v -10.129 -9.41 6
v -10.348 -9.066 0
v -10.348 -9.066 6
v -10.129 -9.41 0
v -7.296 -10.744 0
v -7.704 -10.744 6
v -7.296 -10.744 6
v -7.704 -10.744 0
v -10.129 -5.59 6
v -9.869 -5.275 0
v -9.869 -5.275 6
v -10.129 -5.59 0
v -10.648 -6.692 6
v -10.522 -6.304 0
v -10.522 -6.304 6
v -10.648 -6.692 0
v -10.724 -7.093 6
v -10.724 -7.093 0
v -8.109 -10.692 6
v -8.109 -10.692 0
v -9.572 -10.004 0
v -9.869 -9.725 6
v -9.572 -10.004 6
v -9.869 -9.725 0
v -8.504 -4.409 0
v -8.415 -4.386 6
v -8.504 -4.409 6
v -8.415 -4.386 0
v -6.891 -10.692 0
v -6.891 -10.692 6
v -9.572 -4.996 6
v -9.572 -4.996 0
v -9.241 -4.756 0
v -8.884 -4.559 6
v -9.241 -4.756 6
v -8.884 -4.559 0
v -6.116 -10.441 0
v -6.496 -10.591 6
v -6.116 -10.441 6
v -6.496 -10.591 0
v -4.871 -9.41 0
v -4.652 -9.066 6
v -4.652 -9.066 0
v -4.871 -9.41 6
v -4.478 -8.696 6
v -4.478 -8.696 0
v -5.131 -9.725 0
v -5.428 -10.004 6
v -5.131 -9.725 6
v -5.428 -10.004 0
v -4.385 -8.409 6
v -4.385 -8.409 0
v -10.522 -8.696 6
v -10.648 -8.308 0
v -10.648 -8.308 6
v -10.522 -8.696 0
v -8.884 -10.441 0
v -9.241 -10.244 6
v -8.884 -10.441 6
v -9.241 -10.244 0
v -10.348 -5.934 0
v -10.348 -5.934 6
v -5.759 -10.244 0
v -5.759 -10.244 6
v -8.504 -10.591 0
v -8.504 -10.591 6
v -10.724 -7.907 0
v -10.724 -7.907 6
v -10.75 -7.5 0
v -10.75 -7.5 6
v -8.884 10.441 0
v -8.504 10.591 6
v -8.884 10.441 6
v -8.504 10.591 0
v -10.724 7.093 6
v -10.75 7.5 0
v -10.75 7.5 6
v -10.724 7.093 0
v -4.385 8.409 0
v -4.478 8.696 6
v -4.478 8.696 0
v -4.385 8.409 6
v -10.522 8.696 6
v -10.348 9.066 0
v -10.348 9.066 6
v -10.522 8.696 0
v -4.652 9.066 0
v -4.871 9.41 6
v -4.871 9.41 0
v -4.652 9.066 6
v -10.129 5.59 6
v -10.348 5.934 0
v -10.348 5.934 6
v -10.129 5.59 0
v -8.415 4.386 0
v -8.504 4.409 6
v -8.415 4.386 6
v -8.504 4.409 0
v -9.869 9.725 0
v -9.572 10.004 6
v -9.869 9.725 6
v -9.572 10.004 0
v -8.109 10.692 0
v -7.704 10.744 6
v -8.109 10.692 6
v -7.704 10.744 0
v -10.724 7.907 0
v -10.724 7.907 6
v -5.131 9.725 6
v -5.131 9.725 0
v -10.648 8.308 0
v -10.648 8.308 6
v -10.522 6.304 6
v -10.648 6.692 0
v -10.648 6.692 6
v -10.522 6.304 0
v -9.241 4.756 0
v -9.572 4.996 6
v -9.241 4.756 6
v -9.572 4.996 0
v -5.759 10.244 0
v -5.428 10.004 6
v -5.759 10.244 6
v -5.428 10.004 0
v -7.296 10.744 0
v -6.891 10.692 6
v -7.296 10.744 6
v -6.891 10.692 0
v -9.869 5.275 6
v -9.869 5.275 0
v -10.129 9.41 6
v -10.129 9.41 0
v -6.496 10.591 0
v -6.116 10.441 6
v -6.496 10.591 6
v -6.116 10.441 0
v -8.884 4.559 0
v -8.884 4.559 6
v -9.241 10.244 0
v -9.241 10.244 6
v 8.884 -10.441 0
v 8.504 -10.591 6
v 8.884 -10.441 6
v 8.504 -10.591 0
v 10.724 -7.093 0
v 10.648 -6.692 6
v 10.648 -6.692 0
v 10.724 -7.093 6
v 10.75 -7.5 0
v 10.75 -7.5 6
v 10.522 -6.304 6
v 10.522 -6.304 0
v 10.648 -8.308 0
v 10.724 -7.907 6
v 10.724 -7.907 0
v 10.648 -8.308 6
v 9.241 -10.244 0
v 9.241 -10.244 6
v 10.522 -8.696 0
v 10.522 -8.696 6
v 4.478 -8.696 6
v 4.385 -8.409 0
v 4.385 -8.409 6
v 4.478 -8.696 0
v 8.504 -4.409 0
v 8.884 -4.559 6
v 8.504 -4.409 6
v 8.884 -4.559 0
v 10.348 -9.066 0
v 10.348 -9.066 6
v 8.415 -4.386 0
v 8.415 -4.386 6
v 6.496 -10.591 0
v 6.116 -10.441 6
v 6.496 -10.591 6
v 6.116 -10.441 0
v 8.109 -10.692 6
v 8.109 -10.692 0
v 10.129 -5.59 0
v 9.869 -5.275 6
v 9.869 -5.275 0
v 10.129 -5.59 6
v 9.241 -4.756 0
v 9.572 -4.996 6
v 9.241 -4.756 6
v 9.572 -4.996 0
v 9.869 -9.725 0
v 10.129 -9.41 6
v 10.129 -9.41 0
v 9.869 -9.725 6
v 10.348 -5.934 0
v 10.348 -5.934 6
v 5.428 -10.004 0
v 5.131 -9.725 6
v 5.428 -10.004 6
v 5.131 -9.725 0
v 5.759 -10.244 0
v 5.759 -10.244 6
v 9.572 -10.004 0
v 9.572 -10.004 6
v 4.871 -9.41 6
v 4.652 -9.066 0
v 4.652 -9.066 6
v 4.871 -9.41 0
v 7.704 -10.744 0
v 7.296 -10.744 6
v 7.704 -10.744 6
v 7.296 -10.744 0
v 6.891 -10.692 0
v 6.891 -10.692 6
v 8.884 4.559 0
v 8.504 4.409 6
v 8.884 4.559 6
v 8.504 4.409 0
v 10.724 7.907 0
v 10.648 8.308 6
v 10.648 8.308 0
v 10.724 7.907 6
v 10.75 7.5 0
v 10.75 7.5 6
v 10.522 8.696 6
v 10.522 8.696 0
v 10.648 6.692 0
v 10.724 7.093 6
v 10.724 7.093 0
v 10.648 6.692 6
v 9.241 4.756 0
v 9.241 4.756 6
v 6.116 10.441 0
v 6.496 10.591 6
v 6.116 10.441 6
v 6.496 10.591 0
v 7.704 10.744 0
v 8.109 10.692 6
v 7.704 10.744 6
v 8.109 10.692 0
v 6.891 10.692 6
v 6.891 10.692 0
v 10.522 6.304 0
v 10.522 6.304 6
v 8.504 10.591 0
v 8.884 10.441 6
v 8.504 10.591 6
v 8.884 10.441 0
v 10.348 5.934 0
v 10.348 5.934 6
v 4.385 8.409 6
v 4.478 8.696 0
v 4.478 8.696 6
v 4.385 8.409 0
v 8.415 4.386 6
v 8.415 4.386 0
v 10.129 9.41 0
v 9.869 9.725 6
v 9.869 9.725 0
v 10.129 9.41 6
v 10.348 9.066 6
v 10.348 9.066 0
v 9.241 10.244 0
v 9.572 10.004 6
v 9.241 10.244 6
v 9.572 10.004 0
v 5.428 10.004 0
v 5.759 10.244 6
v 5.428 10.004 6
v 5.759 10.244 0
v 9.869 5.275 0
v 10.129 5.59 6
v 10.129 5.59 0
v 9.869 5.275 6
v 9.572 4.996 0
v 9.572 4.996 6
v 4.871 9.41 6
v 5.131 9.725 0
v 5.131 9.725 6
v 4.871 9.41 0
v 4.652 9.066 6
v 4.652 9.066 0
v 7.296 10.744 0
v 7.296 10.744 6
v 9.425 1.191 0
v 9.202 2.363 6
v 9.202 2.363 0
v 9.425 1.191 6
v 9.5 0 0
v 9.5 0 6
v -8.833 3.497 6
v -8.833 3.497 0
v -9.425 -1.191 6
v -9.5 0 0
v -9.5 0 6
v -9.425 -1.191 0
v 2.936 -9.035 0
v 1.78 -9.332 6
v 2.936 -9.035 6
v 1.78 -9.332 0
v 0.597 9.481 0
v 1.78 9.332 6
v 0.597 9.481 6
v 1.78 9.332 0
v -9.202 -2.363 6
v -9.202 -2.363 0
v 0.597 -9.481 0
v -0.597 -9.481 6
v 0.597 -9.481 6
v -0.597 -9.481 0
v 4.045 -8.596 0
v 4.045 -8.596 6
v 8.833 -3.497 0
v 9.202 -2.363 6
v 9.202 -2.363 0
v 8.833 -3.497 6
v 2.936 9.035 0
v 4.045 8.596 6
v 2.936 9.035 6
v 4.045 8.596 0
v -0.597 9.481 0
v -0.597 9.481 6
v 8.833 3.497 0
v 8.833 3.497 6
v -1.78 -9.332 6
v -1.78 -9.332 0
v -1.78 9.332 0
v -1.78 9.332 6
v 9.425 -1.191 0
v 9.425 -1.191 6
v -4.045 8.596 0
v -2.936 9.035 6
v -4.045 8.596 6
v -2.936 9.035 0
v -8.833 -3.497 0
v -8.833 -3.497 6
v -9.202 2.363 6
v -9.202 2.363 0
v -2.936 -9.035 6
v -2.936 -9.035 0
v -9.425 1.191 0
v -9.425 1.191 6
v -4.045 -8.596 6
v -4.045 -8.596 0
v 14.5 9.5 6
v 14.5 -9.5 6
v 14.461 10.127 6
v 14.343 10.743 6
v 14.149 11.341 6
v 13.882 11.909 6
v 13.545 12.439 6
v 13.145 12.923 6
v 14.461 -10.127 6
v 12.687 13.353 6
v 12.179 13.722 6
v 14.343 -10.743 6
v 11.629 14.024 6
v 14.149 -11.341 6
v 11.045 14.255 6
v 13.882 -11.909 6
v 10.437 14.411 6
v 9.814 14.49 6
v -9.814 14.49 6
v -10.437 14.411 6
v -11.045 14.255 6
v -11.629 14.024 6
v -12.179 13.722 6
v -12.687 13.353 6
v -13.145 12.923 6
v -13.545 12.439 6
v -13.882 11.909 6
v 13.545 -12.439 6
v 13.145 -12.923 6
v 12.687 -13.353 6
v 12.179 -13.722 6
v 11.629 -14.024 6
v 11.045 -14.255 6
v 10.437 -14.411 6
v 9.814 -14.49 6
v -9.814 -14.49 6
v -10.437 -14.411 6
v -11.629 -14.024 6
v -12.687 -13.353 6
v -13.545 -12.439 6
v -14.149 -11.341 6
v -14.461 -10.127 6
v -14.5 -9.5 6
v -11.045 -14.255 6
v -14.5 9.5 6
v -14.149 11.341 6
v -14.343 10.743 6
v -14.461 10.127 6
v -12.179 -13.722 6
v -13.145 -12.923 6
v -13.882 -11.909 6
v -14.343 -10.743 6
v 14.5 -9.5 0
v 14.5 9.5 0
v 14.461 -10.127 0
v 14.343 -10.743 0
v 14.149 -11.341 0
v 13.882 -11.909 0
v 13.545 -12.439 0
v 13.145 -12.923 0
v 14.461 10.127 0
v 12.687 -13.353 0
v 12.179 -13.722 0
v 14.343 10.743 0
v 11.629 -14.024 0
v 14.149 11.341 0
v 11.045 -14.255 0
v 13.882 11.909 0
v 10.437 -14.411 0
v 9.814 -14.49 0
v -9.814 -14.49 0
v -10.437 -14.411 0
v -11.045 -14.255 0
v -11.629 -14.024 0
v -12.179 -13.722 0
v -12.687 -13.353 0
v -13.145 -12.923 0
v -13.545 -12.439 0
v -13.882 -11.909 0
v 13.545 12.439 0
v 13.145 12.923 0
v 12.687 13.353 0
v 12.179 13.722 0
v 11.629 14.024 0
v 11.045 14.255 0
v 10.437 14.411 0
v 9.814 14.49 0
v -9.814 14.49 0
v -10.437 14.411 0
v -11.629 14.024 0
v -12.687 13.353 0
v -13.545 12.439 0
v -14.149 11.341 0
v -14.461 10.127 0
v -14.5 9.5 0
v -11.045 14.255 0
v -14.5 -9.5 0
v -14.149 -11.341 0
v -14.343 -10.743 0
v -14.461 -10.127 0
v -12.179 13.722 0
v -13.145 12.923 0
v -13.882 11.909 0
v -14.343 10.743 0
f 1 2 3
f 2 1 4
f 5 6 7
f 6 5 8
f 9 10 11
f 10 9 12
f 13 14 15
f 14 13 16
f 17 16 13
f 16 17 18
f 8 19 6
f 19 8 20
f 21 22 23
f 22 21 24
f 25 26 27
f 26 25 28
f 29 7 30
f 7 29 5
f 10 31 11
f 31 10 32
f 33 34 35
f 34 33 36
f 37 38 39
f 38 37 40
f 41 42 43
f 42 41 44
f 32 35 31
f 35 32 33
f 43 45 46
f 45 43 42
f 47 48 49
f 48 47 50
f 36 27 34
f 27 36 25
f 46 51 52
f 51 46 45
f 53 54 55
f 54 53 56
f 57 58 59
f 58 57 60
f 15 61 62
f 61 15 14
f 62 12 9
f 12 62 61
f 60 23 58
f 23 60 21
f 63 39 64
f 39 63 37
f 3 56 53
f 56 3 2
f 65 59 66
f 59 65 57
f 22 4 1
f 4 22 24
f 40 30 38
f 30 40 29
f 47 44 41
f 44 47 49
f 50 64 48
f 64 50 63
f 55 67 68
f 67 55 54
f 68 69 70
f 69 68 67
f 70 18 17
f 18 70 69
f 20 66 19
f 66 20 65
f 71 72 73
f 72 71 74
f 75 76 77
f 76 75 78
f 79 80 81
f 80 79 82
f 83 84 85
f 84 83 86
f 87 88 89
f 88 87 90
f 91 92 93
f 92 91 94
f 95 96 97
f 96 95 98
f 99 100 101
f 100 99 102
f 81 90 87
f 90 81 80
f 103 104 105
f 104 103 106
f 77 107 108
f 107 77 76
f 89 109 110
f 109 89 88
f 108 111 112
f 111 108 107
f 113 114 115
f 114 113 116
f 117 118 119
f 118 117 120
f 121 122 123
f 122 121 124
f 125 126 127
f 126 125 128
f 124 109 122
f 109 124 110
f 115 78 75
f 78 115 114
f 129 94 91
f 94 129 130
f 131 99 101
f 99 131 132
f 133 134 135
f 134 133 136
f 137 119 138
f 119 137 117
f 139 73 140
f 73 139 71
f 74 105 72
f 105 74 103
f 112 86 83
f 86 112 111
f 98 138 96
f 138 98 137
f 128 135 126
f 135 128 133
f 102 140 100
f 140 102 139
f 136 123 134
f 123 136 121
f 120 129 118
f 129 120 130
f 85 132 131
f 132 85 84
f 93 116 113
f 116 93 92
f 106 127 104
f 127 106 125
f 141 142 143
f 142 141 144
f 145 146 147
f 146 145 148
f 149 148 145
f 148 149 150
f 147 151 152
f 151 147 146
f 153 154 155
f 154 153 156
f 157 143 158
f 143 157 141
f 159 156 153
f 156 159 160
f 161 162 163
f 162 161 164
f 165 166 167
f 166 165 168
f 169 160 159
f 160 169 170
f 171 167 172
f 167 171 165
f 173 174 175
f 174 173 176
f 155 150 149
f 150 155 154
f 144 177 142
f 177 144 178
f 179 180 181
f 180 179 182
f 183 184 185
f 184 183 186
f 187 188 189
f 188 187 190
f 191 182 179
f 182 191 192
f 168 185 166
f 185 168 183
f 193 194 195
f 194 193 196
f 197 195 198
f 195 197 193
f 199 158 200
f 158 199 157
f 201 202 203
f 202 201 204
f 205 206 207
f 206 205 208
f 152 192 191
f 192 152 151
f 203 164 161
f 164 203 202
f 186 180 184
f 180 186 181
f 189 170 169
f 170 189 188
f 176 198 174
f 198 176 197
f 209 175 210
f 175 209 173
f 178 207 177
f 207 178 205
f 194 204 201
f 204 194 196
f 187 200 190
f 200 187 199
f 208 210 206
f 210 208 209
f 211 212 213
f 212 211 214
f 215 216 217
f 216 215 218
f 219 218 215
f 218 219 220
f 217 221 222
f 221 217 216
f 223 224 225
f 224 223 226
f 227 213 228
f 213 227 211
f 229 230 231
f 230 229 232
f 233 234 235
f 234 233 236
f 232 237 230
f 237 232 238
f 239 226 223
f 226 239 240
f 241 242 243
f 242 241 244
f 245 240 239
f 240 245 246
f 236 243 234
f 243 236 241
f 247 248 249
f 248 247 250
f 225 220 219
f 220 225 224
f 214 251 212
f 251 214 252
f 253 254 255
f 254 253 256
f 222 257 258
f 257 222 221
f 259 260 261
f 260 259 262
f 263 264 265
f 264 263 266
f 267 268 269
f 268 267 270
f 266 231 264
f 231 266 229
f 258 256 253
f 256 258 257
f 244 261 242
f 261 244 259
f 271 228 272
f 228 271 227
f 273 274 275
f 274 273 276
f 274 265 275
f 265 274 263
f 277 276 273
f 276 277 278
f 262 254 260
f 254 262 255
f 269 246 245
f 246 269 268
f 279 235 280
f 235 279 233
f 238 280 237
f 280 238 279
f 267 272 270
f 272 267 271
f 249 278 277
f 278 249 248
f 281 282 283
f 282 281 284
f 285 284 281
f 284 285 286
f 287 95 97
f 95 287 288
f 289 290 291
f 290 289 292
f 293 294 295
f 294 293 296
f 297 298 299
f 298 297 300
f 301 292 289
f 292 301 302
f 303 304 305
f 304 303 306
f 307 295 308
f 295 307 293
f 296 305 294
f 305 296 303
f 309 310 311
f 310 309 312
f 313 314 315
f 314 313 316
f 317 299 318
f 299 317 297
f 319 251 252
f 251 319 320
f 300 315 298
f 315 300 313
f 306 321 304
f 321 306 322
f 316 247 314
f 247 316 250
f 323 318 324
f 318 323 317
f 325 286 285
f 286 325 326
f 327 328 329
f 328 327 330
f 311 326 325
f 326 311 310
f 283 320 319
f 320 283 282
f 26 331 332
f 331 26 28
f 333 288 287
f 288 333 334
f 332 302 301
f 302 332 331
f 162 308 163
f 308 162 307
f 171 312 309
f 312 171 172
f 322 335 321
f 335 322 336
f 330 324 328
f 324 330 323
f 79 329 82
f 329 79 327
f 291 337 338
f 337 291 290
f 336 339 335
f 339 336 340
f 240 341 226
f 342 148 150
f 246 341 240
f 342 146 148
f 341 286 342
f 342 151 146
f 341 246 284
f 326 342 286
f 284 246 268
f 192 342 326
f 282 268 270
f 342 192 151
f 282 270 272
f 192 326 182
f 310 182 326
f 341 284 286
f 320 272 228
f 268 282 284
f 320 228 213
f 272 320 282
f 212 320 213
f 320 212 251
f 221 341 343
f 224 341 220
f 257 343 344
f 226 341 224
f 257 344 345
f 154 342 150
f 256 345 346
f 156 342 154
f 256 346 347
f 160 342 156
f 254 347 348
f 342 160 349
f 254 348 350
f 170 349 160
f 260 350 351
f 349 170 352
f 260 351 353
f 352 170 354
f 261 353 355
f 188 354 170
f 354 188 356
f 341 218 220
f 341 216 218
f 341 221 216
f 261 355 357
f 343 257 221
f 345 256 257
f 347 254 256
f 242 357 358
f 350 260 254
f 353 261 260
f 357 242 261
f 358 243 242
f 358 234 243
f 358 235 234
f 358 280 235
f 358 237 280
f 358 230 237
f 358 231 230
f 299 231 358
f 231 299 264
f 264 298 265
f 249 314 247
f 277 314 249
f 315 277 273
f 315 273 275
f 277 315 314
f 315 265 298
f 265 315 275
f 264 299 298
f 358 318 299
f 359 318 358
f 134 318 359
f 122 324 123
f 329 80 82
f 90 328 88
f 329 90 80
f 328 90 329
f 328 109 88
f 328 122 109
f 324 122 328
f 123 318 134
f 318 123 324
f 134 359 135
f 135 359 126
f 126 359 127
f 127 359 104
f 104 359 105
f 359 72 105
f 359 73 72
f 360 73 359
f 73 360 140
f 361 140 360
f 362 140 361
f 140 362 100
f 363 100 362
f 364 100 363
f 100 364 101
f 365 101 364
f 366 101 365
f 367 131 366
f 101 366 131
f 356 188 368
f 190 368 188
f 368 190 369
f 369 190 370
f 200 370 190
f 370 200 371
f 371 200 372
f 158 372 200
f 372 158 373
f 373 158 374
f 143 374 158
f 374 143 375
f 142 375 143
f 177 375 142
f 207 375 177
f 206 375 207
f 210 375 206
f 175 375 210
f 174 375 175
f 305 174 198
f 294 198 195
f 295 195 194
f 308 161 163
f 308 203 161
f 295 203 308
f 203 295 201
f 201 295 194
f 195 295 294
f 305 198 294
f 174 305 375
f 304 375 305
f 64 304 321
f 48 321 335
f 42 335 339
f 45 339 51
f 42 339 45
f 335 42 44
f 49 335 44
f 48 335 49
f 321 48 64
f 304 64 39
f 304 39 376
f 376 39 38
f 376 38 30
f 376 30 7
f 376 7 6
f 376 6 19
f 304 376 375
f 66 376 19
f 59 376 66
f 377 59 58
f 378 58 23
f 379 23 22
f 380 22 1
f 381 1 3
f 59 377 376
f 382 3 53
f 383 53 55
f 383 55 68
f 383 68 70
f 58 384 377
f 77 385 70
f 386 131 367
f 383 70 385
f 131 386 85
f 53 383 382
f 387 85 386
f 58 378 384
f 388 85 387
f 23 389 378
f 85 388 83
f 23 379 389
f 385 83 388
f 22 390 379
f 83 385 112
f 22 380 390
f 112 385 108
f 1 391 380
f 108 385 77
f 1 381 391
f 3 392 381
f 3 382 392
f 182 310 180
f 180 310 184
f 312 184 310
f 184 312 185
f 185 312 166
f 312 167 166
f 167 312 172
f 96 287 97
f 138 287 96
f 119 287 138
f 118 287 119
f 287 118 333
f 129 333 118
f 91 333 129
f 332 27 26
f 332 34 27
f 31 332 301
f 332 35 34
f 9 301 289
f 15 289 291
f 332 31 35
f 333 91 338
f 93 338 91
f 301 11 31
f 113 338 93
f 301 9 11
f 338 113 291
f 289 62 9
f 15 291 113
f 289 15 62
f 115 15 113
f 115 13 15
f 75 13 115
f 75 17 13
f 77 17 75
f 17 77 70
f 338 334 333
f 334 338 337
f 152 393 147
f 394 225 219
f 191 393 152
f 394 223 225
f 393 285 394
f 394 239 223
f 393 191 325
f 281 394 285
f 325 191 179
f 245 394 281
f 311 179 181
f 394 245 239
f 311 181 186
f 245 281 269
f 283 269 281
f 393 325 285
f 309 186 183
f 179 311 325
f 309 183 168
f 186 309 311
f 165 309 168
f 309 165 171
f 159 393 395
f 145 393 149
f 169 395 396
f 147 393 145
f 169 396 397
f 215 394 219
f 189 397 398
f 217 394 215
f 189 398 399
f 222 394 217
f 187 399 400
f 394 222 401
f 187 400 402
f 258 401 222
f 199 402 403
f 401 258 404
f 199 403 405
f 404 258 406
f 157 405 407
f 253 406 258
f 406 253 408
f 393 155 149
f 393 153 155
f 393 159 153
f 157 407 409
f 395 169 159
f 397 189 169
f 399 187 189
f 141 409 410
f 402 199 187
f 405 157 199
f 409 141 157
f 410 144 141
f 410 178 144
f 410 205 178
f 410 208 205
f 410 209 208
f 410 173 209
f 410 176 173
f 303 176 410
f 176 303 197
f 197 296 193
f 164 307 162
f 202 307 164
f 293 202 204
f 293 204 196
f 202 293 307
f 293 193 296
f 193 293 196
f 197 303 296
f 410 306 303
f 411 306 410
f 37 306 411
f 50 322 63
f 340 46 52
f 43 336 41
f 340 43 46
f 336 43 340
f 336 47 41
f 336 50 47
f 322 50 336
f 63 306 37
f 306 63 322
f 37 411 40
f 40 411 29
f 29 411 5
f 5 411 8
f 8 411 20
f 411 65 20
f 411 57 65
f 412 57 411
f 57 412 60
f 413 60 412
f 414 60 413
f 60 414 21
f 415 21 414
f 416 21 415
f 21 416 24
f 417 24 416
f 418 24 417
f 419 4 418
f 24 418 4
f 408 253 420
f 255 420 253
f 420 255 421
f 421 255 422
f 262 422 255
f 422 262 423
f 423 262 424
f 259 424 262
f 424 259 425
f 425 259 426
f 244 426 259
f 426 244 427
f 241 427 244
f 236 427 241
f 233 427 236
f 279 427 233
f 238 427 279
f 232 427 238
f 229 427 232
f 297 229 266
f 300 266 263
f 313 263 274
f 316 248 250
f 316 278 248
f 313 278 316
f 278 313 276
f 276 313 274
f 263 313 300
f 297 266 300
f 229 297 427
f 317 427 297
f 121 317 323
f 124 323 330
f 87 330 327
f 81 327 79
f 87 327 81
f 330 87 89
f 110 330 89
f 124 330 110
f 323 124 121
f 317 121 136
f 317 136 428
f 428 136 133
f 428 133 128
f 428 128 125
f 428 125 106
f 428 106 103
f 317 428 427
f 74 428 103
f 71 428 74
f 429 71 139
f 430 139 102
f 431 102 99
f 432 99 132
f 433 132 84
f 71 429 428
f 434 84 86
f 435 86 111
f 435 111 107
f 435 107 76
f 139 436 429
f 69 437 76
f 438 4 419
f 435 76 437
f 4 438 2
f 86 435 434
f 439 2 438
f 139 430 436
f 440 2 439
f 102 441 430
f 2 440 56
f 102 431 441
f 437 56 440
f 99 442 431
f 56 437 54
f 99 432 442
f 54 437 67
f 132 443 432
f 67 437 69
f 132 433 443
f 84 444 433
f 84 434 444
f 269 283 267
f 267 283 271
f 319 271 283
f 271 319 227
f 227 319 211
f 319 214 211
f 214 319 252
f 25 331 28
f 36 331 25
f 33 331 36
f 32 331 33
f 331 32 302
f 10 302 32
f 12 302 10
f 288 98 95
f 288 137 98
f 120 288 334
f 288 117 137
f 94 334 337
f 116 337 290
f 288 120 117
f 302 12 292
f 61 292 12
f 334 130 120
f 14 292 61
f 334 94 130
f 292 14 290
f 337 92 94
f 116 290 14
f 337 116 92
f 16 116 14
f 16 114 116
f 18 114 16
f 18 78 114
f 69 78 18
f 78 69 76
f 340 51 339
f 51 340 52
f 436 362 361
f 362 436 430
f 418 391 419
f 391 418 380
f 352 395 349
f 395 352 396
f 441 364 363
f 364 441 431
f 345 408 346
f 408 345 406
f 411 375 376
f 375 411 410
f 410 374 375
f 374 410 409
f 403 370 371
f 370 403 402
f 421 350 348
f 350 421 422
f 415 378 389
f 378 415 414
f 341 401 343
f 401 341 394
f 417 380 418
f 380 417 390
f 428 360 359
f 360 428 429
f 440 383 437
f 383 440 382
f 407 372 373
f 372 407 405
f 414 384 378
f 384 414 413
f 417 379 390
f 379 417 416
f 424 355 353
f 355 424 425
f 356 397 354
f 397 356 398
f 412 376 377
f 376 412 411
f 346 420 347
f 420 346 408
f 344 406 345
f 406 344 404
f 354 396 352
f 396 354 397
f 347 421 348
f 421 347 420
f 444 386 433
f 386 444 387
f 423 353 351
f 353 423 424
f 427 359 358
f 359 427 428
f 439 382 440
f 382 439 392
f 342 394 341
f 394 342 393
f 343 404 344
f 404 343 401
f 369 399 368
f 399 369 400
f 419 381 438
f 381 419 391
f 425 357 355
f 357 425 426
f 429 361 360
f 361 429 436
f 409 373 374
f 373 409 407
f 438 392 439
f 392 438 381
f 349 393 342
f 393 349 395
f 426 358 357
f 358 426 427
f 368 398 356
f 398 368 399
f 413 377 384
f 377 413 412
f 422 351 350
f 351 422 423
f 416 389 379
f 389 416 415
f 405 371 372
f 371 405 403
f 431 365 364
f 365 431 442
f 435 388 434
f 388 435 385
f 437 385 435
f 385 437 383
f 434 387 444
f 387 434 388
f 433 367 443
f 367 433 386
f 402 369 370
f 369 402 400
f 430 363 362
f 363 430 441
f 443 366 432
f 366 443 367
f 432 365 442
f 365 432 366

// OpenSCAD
$fn = 50;


difference() {
	union() {
		hull() {
			translate(v = [-9.5000000000, 9.5000000000, 0]) {
				cylinder(h = 6, r = 5);
			}
			translate(v = [9.5000000000, 9.5000000000, 0]) {
				cylinder(h = 6, r = 5);
			}
			translate(v = [-9.5000000000, -9.5000000000, 0]) {
				cylinder(h = 6, r = 5);
			}
			translate(v = [9.5000000000, -9.5000000000, 0]) {
				cylinder(h = 6, r = 5);
			}
		}
	}
	union() {
		#translate(v = [-7.5000000000, -7.5000000000, -100.0000000000]) {
			cylinder(h = 200, r = 3.2500000000);
		}
		#translate(v = [-7.5000000000, 7.5000000000, -100.0000000000]) {
			cylinder(h = 200, r = 3.2500000000);
		}
		#translate(v = [7.5000000000, -7.5000000000, -100.0000000000]) {
			cylinder(h = 200, r = 3.2500000000);
		}
		#translate(v = [7.5000000000, 7.5000000000, -100.0000000000]) {
			cylinder(h = 200, r = 3.2500000000);
		}
		#cylinder(h = 6, r = 9.5000000000);
	}
}
